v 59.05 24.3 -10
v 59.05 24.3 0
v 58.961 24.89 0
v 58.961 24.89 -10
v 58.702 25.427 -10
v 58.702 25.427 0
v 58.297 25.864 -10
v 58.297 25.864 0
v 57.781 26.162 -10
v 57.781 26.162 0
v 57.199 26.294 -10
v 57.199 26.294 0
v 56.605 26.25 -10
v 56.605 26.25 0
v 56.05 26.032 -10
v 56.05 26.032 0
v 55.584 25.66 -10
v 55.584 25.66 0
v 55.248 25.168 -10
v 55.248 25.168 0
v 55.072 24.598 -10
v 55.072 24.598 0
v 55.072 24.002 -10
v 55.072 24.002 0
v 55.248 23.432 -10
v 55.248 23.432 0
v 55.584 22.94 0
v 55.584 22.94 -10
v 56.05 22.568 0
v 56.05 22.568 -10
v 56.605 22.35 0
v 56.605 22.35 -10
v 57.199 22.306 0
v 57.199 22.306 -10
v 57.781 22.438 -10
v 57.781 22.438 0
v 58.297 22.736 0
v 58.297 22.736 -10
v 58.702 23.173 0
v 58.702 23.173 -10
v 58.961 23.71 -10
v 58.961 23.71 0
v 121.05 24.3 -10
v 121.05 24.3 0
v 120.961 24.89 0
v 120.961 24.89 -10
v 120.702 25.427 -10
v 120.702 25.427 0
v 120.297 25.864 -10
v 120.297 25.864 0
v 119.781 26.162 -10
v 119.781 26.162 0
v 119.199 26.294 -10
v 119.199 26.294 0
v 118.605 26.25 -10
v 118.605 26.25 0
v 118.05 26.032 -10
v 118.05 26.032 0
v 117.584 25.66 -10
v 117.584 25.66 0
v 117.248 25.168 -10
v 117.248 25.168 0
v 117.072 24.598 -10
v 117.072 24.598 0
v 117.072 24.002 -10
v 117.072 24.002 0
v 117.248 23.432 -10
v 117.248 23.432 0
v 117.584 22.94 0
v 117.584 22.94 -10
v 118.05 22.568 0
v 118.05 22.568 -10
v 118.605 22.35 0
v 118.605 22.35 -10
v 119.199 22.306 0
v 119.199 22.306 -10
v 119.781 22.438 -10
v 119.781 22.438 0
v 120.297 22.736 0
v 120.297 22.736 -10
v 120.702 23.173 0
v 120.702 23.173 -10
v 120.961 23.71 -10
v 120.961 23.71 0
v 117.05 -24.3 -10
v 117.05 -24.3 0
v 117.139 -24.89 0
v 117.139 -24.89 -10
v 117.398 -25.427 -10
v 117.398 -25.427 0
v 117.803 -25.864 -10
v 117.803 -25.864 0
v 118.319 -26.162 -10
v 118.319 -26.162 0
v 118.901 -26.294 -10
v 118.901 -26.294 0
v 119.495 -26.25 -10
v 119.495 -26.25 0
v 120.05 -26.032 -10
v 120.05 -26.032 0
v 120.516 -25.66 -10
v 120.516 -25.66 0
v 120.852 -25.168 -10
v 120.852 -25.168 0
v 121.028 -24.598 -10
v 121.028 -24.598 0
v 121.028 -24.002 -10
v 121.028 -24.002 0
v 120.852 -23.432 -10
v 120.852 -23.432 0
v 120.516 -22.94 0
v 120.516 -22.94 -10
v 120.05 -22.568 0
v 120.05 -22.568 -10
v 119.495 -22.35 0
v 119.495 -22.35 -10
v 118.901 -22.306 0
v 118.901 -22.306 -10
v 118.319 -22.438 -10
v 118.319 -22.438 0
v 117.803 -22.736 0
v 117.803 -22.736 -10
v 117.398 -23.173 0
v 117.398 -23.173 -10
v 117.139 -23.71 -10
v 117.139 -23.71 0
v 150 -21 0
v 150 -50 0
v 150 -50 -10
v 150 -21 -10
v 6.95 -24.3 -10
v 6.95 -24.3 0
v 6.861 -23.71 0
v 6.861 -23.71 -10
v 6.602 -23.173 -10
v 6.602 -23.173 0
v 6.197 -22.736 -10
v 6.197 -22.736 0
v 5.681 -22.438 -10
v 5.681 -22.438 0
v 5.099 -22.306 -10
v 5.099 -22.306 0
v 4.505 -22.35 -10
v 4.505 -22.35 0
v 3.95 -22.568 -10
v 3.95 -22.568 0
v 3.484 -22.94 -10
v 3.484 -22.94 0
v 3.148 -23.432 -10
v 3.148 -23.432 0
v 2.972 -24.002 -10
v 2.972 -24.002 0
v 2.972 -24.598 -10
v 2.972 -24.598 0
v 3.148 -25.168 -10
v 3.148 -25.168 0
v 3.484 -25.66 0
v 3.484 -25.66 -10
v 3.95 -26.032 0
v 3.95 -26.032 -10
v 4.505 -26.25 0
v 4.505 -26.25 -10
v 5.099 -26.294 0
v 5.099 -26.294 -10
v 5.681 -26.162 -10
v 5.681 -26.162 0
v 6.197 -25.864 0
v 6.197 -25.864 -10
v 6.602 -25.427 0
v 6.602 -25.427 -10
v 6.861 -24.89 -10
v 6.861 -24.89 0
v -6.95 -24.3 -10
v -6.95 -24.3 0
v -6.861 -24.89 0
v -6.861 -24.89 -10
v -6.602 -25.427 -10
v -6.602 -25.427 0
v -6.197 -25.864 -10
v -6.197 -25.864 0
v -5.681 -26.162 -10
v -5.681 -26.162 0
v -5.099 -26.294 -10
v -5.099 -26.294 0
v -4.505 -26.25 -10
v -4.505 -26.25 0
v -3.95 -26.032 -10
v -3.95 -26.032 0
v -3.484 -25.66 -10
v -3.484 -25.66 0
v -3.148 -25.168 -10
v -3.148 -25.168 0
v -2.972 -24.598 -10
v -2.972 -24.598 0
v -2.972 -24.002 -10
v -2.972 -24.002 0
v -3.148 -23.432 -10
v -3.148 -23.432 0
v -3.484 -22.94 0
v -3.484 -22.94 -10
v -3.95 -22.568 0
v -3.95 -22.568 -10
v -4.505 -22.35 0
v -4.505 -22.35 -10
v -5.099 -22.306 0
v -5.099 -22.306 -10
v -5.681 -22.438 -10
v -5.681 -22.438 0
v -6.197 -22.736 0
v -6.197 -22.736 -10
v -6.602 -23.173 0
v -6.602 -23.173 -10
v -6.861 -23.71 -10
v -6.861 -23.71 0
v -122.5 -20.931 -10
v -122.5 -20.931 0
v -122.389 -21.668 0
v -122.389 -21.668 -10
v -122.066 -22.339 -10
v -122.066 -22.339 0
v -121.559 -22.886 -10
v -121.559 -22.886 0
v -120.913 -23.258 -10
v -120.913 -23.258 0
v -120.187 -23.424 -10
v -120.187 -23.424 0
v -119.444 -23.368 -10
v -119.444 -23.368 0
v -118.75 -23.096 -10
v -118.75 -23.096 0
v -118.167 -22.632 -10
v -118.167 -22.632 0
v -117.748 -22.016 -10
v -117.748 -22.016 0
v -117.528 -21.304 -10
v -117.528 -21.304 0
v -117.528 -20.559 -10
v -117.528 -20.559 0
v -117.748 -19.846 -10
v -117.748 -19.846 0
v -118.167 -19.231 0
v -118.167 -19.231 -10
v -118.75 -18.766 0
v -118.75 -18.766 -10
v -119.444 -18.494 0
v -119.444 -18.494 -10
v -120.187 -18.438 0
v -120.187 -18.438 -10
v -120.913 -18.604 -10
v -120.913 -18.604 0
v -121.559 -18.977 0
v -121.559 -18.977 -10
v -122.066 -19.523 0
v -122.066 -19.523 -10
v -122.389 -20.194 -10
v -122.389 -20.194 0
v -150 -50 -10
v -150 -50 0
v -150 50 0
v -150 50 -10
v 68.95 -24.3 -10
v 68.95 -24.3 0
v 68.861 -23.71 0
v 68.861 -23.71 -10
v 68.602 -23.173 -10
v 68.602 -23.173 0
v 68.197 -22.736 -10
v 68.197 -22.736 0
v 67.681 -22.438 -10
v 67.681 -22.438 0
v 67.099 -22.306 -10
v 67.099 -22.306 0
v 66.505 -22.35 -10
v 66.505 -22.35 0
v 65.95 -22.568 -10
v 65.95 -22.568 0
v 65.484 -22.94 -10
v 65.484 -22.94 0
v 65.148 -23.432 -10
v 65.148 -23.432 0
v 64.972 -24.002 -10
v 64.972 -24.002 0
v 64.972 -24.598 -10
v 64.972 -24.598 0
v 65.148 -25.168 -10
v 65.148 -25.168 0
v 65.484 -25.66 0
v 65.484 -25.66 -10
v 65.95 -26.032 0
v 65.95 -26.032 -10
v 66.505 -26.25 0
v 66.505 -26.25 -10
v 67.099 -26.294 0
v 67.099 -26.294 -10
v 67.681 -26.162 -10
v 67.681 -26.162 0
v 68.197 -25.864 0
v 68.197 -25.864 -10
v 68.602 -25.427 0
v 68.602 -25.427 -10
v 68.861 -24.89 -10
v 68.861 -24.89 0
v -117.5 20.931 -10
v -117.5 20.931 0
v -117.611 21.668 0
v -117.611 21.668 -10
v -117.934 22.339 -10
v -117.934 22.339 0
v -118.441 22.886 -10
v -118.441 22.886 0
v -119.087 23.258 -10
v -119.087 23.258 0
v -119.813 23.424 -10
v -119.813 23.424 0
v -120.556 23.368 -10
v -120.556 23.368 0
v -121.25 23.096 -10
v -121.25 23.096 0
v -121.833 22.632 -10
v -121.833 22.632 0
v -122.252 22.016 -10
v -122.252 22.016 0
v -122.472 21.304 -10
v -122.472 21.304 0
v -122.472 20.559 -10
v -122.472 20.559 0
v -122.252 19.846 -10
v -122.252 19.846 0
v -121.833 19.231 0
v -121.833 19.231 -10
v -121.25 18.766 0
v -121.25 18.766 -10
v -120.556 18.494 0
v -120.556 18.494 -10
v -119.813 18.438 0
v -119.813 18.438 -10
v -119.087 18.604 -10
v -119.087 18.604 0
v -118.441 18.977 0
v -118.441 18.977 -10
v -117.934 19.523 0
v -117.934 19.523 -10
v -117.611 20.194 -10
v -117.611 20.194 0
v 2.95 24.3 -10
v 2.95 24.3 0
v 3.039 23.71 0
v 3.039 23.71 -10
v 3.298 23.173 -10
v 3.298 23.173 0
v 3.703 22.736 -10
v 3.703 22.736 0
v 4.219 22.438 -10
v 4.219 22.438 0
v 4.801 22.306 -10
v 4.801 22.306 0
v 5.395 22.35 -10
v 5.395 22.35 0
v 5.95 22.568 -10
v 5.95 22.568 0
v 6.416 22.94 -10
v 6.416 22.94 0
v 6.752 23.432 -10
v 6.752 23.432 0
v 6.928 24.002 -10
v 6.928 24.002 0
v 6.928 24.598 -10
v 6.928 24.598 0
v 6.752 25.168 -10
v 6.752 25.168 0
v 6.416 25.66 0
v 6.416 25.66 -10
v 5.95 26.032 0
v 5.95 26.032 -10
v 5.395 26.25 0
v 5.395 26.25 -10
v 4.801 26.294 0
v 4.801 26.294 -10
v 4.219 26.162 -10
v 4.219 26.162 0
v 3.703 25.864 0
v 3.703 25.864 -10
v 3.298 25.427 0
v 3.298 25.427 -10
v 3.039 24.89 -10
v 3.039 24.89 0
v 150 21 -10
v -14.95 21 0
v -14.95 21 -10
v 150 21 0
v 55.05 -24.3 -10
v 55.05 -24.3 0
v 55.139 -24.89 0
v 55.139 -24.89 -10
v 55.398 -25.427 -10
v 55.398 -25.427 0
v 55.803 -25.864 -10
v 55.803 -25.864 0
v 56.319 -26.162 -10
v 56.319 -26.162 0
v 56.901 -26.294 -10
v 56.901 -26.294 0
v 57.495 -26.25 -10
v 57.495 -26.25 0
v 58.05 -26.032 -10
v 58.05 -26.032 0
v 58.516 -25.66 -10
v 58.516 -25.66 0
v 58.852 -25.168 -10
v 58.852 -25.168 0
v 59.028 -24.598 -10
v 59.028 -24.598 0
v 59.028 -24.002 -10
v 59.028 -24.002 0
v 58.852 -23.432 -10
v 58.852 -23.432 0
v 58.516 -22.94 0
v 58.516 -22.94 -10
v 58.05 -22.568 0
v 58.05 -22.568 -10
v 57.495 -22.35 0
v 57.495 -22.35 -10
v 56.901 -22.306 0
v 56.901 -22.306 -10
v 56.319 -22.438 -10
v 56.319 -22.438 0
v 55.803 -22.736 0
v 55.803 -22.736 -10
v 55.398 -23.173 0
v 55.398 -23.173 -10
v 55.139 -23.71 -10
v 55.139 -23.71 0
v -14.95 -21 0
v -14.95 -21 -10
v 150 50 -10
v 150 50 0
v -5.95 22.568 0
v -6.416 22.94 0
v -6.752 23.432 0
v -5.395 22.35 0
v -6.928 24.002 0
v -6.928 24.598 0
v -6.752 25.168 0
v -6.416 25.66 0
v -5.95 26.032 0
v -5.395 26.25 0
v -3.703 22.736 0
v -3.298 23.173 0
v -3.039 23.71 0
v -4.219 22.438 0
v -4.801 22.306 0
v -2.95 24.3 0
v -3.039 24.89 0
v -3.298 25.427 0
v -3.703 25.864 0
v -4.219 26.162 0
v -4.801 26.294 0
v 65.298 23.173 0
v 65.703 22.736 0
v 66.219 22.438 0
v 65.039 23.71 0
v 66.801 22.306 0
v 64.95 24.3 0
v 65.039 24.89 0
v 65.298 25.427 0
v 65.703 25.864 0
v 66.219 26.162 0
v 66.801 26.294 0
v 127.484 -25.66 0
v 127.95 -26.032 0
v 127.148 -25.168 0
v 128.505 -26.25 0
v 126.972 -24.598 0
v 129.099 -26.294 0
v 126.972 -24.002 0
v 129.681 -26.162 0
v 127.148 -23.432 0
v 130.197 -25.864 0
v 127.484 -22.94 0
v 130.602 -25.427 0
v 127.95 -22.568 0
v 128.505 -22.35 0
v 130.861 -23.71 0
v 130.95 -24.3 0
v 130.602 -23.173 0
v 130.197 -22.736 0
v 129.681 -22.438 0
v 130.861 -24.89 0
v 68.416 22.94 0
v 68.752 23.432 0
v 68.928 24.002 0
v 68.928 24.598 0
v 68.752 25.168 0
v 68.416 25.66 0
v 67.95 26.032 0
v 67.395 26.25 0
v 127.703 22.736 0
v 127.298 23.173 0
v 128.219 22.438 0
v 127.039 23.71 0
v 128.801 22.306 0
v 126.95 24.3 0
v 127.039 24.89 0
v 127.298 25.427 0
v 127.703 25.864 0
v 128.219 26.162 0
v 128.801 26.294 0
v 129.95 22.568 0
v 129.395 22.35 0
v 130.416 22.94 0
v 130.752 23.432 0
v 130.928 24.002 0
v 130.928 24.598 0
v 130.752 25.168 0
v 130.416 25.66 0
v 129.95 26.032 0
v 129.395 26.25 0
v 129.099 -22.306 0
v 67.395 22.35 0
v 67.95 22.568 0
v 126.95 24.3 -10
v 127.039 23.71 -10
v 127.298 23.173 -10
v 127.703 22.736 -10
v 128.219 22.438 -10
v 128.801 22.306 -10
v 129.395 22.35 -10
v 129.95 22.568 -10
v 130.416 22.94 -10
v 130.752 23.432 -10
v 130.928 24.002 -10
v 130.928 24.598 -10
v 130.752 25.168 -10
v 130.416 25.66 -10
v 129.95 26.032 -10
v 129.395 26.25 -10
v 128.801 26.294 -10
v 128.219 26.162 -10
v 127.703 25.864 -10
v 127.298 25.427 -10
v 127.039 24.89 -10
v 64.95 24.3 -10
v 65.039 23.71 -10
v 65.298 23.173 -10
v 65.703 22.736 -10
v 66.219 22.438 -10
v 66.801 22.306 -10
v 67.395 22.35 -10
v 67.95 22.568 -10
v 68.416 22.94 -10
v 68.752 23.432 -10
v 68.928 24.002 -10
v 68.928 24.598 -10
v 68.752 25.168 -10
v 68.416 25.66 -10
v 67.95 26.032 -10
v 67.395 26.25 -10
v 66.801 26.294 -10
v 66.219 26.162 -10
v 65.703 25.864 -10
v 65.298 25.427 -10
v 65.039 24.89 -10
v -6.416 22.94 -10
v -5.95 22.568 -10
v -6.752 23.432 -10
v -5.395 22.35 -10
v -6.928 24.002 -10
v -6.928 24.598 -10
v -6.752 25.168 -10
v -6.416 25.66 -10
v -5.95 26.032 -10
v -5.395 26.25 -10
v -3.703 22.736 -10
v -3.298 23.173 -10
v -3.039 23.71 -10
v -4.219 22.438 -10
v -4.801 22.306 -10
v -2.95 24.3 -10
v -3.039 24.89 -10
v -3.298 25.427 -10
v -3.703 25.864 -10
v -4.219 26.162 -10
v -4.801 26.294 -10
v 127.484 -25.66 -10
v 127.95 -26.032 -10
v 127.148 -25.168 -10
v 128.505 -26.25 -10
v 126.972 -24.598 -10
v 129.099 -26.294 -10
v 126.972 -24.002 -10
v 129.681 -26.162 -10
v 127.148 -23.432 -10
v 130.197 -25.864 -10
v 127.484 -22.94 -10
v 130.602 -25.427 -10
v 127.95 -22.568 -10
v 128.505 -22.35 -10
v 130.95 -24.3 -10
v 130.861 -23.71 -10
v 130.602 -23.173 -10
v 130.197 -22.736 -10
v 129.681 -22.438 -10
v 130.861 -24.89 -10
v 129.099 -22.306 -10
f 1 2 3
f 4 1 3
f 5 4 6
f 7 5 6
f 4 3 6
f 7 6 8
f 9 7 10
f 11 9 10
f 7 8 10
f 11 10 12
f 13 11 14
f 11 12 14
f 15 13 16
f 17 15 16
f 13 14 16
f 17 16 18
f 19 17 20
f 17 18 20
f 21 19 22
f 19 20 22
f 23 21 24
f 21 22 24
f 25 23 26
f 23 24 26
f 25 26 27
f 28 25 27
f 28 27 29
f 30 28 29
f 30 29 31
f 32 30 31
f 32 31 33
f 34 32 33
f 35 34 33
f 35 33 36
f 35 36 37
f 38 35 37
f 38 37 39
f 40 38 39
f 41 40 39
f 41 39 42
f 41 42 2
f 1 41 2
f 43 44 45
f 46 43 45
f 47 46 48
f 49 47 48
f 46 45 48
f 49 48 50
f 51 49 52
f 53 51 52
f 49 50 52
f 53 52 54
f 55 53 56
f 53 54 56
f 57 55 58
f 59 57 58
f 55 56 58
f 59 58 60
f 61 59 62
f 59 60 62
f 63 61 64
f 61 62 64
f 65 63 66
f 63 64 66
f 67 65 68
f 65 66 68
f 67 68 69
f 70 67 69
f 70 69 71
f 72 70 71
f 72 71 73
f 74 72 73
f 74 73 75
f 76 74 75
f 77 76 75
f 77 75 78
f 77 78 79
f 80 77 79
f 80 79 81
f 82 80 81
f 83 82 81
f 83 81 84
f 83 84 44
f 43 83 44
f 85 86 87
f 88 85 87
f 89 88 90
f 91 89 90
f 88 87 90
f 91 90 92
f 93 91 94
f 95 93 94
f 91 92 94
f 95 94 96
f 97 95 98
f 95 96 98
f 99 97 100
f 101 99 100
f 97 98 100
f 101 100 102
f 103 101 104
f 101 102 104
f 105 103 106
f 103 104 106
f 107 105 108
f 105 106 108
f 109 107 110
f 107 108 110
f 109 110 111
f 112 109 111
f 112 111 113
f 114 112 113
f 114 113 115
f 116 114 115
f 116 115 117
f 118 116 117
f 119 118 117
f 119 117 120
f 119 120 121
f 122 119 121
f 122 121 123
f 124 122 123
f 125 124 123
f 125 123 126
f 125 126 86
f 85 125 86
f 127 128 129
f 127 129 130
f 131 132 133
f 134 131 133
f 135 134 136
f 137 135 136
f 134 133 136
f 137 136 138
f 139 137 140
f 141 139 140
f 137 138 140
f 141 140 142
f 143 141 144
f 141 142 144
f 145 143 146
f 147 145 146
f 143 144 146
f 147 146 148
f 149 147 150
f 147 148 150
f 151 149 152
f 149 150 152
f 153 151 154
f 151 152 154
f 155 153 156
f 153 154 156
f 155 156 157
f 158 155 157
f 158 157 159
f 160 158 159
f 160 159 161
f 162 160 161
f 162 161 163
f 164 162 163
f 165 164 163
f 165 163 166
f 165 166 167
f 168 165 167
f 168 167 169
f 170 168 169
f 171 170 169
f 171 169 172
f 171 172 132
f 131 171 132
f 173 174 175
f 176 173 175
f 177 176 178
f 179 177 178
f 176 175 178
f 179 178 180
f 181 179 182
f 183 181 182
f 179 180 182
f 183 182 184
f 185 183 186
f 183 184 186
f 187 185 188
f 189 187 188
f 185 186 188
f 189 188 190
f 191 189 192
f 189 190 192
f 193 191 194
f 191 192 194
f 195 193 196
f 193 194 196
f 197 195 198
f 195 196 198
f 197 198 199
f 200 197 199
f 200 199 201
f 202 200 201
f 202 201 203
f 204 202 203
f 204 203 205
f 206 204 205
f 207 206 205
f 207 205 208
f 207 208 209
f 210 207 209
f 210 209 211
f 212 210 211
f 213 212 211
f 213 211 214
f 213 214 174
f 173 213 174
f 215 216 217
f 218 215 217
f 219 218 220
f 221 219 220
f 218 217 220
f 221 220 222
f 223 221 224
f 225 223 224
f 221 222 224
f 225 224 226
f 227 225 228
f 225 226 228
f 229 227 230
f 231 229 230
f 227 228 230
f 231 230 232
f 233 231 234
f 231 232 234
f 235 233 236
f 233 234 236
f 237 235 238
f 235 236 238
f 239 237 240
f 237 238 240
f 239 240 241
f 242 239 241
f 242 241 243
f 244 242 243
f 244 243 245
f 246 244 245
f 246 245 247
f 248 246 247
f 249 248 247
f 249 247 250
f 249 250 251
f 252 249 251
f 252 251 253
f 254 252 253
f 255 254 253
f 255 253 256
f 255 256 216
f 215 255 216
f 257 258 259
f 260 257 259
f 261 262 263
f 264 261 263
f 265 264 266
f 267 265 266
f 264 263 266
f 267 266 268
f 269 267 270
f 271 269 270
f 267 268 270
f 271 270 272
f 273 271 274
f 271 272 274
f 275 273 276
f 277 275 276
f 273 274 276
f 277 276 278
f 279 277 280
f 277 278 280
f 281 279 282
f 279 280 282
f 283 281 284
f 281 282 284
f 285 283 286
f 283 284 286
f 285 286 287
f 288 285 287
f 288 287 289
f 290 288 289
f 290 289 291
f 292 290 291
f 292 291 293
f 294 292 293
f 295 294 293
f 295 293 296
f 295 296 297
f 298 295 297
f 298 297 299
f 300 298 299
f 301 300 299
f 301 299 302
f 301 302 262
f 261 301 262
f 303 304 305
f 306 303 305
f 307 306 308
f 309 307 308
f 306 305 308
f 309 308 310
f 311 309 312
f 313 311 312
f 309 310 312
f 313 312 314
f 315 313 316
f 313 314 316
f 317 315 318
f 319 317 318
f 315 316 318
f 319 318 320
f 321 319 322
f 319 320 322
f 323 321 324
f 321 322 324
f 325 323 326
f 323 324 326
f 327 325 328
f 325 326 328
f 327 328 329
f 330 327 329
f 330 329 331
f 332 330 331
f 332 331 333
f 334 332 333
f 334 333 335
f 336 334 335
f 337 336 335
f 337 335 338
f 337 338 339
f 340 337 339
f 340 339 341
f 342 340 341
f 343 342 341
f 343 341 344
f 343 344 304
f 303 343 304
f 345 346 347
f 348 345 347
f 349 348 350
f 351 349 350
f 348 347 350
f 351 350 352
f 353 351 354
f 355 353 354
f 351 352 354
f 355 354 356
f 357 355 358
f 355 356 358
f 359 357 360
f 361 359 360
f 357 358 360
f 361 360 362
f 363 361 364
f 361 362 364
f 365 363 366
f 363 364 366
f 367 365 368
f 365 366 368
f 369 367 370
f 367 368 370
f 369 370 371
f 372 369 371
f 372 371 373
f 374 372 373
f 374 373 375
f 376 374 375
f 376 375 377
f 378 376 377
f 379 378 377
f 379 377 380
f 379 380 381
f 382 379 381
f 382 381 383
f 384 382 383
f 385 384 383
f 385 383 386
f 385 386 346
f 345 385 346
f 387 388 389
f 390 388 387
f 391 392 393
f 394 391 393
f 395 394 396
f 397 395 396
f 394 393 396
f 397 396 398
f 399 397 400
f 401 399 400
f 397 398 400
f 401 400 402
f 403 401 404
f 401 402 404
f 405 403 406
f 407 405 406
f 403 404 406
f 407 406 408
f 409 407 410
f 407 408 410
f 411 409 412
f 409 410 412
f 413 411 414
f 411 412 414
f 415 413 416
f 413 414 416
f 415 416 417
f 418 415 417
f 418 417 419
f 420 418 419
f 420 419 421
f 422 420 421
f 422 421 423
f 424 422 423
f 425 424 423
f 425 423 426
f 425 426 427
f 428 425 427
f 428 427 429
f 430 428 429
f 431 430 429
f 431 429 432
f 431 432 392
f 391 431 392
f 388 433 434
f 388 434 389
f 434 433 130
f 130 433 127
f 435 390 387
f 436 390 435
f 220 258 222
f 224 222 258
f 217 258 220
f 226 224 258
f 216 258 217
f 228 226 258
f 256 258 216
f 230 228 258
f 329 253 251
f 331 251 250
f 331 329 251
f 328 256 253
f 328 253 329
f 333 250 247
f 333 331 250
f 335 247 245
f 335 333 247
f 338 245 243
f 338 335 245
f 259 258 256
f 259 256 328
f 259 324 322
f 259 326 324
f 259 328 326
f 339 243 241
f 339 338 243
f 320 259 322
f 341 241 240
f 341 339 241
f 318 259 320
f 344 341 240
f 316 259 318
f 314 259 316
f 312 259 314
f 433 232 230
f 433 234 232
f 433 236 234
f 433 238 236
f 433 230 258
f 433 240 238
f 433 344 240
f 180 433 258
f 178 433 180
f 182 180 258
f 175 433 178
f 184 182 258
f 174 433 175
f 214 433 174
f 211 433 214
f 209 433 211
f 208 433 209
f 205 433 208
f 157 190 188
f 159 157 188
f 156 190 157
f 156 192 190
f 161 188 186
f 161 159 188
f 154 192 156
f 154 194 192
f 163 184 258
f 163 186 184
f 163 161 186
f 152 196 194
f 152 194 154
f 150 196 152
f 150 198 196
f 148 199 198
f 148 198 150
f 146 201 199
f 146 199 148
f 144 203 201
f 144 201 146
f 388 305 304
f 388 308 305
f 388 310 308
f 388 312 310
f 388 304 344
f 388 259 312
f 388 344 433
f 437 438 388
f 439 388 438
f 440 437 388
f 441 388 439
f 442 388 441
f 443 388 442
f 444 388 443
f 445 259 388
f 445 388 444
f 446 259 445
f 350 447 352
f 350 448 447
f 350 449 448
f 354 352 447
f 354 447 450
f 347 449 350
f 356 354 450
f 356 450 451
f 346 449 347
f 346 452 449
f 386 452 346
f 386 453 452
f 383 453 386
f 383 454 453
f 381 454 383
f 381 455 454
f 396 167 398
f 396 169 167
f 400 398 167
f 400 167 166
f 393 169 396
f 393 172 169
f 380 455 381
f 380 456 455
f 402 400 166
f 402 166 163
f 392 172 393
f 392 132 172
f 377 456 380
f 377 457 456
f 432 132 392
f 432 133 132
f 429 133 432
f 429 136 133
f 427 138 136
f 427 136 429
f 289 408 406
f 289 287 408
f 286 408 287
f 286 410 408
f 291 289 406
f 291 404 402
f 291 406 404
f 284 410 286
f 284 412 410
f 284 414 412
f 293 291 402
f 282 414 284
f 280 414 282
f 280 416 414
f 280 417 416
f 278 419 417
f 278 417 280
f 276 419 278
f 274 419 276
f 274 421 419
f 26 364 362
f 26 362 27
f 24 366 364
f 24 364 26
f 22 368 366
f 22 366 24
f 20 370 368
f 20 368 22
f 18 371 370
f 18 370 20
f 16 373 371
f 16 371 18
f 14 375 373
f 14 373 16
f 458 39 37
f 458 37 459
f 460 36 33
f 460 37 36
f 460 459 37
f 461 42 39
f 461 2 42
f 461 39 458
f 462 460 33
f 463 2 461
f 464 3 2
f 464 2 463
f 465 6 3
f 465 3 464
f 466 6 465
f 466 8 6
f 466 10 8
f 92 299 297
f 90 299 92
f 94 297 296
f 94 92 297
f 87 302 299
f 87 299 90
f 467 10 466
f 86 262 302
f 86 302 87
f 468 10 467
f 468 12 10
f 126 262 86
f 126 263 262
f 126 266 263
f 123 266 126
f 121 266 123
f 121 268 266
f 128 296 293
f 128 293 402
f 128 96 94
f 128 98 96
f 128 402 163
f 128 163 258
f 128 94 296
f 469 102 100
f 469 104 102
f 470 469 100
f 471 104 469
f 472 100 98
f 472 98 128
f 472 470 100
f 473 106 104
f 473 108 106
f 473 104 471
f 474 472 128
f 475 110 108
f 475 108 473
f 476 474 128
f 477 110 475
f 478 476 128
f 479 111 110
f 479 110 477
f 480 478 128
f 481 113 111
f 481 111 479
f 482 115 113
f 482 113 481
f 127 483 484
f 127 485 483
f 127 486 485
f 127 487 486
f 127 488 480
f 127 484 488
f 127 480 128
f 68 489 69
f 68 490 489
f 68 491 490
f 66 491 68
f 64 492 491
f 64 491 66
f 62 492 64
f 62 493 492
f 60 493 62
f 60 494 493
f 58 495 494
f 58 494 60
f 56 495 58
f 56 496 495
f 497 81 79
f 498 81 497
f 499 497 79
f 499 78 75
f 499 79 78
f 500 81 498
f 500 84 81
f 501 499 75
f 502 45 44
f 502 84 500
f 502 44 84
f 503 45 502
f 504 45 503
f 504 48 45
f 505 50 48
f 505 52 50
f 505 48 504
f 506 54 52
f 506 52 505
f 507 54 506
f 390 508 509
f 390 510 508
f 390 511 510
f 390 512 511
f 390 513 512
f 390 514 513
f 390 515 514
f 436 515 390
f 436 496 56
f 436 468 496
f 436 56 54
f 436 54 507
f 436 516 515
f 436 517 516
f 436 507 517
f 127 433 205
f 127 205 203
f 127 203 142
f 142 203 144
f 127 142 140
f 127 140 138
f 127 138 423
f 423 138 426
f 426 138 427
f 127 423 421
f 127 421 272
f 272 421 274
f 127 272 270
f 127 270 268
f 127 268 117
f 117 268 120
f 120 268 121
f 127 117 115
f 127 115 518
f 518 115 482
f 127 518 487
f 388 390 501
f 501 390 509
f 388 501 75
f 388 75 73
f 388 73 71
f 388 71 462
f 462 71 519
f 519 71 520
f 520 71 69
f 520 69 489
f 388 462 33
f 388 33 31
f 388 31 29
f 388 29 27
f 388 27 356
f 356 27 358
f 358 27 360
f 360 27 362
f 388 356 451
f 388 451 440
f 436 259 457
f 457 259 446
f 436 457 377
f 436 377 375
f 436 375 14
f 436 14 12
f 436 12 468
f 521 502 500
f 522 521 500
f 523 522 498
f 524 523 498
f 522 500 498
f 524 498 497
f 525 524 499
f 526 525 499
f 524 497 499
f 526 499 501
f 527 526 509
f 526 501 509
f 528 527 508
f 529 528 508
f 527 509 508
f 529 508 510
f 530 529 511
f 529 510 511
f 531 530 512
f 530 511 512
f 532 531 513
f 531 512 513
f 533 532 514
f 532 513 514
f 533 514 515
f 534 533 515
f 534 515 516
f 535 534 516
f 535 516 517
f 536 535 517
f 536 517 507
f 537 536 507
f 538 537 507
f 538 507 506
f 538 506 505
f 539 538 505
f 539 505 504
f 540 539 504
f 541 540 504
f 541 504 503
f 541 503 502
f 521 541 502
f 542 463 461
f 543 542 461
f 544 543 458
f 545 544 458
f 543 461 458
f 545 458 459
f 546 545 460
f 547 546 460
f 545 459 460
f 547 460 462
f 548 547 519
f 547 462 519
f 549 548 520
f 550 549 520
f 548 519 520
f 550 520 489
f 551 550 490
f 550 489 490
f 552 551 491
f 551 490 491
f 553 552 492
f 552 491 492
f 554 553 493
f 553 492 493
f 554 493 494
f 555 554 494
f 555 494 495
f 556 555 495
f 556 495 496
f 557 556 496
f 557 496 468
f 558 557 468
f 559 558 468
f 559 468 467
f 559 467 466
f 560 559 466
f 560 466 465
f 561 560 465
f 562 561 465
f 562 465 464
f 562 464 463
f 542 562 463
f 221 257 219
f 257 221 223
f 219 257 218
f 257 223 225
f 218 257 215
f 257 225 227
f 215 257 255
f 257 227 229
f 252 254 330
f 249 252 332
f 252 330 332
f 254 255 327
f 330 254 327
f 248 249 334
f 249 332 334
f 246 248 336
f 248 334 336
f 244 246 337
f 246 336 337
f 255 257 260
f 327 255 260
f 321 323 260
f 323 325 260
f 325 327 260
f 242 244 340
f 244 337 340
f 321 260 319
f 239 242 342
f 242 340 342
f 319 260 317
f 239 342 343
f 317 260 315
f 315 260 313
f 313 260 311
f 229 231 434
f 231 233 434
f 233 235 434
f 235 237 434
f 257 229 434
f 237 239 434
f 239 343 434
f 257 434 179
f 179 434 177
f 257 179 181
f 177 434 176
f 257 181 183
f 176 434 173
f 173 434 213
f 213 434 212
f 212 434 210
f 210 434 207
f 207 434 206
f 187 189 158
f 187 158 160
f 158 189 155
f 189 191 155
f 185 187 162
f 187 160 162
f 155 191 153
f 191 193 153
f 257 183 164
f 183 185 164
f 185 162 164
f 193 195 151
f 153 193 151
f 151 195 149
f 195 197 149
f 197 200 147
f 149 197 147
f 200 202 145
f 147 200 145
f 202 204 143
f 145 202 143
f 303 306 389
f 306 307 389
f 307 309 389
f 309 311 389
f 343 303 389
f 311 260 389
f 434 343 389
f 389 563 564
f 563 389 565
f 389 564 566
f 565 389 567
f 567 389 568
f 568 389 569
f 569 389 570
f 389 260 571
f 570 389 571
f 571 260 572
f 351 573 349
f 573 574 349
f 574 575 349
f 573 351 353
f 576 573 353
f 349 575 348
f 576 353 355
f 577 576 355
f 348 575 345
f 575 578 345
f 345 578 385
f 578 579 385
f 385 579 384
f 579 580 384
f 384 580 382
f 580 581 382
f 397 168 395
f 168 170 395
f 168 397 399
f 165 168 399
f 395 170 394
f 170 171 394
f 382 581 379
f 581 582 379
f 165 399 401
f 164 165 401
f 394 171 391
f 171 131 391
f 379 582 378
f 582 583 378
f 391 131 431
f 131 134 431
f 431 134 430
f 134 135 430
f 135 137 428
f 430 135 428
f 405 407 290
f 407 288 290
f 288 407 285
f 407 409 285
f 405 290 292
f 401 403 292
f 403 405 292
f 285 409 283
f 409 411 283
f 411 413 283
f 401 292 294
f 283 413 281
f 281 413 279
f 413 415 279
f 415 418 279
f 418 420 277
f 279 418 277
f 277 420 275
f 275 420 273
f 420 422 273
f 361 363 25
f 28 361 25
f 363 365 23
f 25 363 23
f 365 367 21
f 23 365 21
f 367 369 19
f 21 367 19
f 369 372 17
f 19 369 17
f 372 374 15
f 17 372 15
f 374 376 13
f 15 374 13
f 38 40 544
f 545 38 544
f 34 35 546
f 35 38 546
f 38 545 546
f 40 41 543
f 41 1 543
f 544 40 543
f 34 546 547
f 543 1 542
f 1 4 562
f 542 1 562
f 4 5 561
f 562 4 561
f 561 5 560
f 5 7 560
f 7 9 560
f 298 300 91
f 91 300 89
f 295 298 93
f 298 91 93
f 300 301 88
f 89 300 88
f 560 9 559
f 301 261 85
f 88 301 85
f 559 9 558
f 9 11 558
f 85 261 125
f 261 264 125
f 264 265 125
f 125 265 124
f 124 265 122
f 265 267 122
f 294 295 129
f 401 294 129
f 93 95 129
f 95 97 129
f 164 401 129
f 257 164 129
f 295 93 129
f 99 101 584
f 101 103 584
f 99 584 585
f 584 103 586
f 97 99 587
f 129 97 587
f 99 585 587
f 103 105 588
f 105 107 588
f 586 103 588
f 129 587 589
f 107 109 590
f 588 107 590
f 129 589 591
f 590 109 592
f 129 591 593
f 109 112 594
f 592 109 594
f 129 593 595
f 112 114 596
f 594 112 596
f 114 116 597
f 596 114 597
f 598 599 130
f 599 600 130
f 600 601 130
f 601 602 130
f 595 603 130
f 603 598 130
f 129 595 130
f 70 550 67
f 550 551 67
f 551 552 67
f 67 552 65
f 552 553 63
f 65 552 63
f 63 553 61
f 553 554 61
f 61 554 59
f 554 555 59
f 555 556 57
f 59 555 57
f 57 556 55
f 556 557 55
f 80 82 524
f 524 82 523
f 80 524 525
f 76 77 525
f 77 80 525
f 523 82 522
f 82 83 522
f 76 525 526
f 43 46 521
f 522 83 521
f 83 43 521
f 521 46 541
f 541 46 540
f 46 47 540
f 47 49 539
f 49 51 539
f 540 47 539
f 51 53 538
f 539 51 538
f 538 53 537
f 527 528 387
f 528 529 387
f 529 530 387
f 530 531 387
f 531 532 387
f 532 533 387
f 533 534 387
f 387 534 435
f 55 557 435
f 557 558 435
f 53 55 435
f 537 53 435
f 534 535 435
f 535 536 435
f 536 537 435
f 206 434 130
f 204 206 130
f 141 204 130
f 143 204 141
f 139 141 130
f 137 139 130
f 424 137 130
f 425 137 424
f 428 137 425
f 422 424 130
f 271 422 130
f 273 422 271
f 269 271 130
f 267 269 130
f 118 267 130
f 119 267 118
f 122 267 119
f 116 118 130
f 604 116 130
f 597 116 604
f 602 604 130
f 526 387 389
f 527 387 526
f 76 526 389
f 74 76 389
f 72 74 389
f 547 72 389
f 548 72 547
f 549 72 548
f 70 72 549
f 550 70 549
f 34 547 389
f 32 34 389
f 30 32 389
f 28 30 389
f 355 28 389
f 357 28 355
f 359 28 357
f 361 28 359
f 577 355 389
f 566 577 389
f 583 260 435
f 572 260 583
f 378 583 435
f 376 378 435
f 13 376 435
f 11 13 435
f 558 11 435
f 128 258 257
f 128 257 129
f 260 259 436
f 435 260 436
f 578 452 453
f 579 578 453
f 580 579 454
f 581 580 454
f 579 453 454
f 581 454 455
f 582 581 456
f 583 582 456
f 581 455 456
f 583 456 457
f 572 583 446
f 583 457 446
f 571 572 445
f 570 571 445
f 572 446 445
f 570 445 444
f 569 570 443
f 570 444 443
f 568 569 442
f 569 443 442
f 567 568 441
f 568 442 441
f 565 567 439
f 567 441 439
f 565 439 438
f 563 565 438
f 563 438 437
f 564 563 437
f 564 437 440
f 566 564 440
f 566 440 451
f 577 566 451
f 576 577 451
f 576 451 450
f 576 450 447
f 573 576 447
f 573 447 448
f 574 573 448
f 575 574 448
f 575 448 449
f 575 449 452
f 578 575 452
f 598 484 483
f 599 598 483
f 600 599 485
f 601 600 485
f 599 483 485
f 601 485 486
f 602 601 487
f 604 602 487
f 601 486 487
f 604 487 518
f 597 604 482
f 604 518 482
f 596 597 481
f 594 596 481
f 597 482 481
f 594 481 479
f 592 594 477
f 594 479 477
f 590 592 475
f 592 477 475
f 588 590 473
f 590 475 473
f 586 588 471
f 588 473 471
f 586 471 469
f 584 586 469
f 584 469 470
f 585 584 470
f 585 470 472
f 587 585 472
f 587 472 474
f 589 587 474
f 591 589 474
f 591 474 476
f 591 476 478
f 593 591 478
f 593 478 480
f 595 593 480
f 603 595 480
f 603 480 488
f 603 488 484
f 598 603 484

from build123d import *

# Parameters (mm, degrees)
SKETCH7_W           = 300
SKETCH7_H           = 100
BOSS_EXTRUDE1_DEPTH = 10
SKETCH1_R           = 2
CUT_EXTRUDE2_DEPTH  = 159.429795178
LPATTERN1_COUNT     = 4
LPATTERN1_PITCH     = 62
SKETCH8_W           = 164.95
SKETCH8_H           = 42
CUT_EXTRUDE3_DEPTH  = 159.429795178
SKETCH10_R          = 2.5
CUT_EXTRUDE4_DEPTH  = 159.429795178


with BuildPart() as part:
    # Sketch7 → Boss-Extrude1 (new body)
    with BuildSketch(Plane.XY):
        Rectangle(SKETCH7_W, SKETCH7_H)
    extrude(amount=-BOSS_EXTRUDE1_DEPTH)

    # Sketch1 → Cut-Extrude2 (cut, through all)
    with BuildSketch(Plane.XY):
        with Locations((4.95, -24.3)):
            Circle(SKETCH1_R)
        with Locations(Location((-4.95, -24.3, 0), (0, 0, 180))):
            Circle(SKETCH1_R)
        with Locations((-4.95, 24.3)):
            Circle(SKETCH1_R)
        with Locations(Location((4.95, 24.3, 0), (0, 0, 180))):
            Circle(SKETCH1_R)
    cut_extrude2 = extrude(amount=-CUT_EXTRUDE2_DEPTH, mode=Mode.SUBTRACT)

    # LPattern1: Cut-Extrude2 ×4
    with Locations(*[(i * LPATTERN1_PITCH, 0, 0) for i in range(1, LPATTERN1_COUNT)]):
        add(cut_extrude2, mode=Mode.SUBTRACT)

    # Sketch8 → Cut-Extrude3 (cut, through all)
    with BuildSketch(Plane.XY):
        with Locations((67.525, 0)):
            Rectangle(SKETCH8_W, SKETCH8_H)
    extrude(amount=-CUT_EXTRUDE3_DEPTH, mode=Mode.SUBTRACT)

    # Sketch10 → Cut-Extrude4 (cut, through all)
    with BuildSketch(Plane.XY):
        with Locations((-120, 20.93113616)):
            Circle(SKETCH10_R)
        with Locations(Location((-120, -20.93113616, 0), (0, 0, 180))):
            Circle(SKETCH10_R)
    extrude(amount=-CUT_EXTRUDE4_DEPTH, mode=Mode.SUBTRACT)


solid = part.part
